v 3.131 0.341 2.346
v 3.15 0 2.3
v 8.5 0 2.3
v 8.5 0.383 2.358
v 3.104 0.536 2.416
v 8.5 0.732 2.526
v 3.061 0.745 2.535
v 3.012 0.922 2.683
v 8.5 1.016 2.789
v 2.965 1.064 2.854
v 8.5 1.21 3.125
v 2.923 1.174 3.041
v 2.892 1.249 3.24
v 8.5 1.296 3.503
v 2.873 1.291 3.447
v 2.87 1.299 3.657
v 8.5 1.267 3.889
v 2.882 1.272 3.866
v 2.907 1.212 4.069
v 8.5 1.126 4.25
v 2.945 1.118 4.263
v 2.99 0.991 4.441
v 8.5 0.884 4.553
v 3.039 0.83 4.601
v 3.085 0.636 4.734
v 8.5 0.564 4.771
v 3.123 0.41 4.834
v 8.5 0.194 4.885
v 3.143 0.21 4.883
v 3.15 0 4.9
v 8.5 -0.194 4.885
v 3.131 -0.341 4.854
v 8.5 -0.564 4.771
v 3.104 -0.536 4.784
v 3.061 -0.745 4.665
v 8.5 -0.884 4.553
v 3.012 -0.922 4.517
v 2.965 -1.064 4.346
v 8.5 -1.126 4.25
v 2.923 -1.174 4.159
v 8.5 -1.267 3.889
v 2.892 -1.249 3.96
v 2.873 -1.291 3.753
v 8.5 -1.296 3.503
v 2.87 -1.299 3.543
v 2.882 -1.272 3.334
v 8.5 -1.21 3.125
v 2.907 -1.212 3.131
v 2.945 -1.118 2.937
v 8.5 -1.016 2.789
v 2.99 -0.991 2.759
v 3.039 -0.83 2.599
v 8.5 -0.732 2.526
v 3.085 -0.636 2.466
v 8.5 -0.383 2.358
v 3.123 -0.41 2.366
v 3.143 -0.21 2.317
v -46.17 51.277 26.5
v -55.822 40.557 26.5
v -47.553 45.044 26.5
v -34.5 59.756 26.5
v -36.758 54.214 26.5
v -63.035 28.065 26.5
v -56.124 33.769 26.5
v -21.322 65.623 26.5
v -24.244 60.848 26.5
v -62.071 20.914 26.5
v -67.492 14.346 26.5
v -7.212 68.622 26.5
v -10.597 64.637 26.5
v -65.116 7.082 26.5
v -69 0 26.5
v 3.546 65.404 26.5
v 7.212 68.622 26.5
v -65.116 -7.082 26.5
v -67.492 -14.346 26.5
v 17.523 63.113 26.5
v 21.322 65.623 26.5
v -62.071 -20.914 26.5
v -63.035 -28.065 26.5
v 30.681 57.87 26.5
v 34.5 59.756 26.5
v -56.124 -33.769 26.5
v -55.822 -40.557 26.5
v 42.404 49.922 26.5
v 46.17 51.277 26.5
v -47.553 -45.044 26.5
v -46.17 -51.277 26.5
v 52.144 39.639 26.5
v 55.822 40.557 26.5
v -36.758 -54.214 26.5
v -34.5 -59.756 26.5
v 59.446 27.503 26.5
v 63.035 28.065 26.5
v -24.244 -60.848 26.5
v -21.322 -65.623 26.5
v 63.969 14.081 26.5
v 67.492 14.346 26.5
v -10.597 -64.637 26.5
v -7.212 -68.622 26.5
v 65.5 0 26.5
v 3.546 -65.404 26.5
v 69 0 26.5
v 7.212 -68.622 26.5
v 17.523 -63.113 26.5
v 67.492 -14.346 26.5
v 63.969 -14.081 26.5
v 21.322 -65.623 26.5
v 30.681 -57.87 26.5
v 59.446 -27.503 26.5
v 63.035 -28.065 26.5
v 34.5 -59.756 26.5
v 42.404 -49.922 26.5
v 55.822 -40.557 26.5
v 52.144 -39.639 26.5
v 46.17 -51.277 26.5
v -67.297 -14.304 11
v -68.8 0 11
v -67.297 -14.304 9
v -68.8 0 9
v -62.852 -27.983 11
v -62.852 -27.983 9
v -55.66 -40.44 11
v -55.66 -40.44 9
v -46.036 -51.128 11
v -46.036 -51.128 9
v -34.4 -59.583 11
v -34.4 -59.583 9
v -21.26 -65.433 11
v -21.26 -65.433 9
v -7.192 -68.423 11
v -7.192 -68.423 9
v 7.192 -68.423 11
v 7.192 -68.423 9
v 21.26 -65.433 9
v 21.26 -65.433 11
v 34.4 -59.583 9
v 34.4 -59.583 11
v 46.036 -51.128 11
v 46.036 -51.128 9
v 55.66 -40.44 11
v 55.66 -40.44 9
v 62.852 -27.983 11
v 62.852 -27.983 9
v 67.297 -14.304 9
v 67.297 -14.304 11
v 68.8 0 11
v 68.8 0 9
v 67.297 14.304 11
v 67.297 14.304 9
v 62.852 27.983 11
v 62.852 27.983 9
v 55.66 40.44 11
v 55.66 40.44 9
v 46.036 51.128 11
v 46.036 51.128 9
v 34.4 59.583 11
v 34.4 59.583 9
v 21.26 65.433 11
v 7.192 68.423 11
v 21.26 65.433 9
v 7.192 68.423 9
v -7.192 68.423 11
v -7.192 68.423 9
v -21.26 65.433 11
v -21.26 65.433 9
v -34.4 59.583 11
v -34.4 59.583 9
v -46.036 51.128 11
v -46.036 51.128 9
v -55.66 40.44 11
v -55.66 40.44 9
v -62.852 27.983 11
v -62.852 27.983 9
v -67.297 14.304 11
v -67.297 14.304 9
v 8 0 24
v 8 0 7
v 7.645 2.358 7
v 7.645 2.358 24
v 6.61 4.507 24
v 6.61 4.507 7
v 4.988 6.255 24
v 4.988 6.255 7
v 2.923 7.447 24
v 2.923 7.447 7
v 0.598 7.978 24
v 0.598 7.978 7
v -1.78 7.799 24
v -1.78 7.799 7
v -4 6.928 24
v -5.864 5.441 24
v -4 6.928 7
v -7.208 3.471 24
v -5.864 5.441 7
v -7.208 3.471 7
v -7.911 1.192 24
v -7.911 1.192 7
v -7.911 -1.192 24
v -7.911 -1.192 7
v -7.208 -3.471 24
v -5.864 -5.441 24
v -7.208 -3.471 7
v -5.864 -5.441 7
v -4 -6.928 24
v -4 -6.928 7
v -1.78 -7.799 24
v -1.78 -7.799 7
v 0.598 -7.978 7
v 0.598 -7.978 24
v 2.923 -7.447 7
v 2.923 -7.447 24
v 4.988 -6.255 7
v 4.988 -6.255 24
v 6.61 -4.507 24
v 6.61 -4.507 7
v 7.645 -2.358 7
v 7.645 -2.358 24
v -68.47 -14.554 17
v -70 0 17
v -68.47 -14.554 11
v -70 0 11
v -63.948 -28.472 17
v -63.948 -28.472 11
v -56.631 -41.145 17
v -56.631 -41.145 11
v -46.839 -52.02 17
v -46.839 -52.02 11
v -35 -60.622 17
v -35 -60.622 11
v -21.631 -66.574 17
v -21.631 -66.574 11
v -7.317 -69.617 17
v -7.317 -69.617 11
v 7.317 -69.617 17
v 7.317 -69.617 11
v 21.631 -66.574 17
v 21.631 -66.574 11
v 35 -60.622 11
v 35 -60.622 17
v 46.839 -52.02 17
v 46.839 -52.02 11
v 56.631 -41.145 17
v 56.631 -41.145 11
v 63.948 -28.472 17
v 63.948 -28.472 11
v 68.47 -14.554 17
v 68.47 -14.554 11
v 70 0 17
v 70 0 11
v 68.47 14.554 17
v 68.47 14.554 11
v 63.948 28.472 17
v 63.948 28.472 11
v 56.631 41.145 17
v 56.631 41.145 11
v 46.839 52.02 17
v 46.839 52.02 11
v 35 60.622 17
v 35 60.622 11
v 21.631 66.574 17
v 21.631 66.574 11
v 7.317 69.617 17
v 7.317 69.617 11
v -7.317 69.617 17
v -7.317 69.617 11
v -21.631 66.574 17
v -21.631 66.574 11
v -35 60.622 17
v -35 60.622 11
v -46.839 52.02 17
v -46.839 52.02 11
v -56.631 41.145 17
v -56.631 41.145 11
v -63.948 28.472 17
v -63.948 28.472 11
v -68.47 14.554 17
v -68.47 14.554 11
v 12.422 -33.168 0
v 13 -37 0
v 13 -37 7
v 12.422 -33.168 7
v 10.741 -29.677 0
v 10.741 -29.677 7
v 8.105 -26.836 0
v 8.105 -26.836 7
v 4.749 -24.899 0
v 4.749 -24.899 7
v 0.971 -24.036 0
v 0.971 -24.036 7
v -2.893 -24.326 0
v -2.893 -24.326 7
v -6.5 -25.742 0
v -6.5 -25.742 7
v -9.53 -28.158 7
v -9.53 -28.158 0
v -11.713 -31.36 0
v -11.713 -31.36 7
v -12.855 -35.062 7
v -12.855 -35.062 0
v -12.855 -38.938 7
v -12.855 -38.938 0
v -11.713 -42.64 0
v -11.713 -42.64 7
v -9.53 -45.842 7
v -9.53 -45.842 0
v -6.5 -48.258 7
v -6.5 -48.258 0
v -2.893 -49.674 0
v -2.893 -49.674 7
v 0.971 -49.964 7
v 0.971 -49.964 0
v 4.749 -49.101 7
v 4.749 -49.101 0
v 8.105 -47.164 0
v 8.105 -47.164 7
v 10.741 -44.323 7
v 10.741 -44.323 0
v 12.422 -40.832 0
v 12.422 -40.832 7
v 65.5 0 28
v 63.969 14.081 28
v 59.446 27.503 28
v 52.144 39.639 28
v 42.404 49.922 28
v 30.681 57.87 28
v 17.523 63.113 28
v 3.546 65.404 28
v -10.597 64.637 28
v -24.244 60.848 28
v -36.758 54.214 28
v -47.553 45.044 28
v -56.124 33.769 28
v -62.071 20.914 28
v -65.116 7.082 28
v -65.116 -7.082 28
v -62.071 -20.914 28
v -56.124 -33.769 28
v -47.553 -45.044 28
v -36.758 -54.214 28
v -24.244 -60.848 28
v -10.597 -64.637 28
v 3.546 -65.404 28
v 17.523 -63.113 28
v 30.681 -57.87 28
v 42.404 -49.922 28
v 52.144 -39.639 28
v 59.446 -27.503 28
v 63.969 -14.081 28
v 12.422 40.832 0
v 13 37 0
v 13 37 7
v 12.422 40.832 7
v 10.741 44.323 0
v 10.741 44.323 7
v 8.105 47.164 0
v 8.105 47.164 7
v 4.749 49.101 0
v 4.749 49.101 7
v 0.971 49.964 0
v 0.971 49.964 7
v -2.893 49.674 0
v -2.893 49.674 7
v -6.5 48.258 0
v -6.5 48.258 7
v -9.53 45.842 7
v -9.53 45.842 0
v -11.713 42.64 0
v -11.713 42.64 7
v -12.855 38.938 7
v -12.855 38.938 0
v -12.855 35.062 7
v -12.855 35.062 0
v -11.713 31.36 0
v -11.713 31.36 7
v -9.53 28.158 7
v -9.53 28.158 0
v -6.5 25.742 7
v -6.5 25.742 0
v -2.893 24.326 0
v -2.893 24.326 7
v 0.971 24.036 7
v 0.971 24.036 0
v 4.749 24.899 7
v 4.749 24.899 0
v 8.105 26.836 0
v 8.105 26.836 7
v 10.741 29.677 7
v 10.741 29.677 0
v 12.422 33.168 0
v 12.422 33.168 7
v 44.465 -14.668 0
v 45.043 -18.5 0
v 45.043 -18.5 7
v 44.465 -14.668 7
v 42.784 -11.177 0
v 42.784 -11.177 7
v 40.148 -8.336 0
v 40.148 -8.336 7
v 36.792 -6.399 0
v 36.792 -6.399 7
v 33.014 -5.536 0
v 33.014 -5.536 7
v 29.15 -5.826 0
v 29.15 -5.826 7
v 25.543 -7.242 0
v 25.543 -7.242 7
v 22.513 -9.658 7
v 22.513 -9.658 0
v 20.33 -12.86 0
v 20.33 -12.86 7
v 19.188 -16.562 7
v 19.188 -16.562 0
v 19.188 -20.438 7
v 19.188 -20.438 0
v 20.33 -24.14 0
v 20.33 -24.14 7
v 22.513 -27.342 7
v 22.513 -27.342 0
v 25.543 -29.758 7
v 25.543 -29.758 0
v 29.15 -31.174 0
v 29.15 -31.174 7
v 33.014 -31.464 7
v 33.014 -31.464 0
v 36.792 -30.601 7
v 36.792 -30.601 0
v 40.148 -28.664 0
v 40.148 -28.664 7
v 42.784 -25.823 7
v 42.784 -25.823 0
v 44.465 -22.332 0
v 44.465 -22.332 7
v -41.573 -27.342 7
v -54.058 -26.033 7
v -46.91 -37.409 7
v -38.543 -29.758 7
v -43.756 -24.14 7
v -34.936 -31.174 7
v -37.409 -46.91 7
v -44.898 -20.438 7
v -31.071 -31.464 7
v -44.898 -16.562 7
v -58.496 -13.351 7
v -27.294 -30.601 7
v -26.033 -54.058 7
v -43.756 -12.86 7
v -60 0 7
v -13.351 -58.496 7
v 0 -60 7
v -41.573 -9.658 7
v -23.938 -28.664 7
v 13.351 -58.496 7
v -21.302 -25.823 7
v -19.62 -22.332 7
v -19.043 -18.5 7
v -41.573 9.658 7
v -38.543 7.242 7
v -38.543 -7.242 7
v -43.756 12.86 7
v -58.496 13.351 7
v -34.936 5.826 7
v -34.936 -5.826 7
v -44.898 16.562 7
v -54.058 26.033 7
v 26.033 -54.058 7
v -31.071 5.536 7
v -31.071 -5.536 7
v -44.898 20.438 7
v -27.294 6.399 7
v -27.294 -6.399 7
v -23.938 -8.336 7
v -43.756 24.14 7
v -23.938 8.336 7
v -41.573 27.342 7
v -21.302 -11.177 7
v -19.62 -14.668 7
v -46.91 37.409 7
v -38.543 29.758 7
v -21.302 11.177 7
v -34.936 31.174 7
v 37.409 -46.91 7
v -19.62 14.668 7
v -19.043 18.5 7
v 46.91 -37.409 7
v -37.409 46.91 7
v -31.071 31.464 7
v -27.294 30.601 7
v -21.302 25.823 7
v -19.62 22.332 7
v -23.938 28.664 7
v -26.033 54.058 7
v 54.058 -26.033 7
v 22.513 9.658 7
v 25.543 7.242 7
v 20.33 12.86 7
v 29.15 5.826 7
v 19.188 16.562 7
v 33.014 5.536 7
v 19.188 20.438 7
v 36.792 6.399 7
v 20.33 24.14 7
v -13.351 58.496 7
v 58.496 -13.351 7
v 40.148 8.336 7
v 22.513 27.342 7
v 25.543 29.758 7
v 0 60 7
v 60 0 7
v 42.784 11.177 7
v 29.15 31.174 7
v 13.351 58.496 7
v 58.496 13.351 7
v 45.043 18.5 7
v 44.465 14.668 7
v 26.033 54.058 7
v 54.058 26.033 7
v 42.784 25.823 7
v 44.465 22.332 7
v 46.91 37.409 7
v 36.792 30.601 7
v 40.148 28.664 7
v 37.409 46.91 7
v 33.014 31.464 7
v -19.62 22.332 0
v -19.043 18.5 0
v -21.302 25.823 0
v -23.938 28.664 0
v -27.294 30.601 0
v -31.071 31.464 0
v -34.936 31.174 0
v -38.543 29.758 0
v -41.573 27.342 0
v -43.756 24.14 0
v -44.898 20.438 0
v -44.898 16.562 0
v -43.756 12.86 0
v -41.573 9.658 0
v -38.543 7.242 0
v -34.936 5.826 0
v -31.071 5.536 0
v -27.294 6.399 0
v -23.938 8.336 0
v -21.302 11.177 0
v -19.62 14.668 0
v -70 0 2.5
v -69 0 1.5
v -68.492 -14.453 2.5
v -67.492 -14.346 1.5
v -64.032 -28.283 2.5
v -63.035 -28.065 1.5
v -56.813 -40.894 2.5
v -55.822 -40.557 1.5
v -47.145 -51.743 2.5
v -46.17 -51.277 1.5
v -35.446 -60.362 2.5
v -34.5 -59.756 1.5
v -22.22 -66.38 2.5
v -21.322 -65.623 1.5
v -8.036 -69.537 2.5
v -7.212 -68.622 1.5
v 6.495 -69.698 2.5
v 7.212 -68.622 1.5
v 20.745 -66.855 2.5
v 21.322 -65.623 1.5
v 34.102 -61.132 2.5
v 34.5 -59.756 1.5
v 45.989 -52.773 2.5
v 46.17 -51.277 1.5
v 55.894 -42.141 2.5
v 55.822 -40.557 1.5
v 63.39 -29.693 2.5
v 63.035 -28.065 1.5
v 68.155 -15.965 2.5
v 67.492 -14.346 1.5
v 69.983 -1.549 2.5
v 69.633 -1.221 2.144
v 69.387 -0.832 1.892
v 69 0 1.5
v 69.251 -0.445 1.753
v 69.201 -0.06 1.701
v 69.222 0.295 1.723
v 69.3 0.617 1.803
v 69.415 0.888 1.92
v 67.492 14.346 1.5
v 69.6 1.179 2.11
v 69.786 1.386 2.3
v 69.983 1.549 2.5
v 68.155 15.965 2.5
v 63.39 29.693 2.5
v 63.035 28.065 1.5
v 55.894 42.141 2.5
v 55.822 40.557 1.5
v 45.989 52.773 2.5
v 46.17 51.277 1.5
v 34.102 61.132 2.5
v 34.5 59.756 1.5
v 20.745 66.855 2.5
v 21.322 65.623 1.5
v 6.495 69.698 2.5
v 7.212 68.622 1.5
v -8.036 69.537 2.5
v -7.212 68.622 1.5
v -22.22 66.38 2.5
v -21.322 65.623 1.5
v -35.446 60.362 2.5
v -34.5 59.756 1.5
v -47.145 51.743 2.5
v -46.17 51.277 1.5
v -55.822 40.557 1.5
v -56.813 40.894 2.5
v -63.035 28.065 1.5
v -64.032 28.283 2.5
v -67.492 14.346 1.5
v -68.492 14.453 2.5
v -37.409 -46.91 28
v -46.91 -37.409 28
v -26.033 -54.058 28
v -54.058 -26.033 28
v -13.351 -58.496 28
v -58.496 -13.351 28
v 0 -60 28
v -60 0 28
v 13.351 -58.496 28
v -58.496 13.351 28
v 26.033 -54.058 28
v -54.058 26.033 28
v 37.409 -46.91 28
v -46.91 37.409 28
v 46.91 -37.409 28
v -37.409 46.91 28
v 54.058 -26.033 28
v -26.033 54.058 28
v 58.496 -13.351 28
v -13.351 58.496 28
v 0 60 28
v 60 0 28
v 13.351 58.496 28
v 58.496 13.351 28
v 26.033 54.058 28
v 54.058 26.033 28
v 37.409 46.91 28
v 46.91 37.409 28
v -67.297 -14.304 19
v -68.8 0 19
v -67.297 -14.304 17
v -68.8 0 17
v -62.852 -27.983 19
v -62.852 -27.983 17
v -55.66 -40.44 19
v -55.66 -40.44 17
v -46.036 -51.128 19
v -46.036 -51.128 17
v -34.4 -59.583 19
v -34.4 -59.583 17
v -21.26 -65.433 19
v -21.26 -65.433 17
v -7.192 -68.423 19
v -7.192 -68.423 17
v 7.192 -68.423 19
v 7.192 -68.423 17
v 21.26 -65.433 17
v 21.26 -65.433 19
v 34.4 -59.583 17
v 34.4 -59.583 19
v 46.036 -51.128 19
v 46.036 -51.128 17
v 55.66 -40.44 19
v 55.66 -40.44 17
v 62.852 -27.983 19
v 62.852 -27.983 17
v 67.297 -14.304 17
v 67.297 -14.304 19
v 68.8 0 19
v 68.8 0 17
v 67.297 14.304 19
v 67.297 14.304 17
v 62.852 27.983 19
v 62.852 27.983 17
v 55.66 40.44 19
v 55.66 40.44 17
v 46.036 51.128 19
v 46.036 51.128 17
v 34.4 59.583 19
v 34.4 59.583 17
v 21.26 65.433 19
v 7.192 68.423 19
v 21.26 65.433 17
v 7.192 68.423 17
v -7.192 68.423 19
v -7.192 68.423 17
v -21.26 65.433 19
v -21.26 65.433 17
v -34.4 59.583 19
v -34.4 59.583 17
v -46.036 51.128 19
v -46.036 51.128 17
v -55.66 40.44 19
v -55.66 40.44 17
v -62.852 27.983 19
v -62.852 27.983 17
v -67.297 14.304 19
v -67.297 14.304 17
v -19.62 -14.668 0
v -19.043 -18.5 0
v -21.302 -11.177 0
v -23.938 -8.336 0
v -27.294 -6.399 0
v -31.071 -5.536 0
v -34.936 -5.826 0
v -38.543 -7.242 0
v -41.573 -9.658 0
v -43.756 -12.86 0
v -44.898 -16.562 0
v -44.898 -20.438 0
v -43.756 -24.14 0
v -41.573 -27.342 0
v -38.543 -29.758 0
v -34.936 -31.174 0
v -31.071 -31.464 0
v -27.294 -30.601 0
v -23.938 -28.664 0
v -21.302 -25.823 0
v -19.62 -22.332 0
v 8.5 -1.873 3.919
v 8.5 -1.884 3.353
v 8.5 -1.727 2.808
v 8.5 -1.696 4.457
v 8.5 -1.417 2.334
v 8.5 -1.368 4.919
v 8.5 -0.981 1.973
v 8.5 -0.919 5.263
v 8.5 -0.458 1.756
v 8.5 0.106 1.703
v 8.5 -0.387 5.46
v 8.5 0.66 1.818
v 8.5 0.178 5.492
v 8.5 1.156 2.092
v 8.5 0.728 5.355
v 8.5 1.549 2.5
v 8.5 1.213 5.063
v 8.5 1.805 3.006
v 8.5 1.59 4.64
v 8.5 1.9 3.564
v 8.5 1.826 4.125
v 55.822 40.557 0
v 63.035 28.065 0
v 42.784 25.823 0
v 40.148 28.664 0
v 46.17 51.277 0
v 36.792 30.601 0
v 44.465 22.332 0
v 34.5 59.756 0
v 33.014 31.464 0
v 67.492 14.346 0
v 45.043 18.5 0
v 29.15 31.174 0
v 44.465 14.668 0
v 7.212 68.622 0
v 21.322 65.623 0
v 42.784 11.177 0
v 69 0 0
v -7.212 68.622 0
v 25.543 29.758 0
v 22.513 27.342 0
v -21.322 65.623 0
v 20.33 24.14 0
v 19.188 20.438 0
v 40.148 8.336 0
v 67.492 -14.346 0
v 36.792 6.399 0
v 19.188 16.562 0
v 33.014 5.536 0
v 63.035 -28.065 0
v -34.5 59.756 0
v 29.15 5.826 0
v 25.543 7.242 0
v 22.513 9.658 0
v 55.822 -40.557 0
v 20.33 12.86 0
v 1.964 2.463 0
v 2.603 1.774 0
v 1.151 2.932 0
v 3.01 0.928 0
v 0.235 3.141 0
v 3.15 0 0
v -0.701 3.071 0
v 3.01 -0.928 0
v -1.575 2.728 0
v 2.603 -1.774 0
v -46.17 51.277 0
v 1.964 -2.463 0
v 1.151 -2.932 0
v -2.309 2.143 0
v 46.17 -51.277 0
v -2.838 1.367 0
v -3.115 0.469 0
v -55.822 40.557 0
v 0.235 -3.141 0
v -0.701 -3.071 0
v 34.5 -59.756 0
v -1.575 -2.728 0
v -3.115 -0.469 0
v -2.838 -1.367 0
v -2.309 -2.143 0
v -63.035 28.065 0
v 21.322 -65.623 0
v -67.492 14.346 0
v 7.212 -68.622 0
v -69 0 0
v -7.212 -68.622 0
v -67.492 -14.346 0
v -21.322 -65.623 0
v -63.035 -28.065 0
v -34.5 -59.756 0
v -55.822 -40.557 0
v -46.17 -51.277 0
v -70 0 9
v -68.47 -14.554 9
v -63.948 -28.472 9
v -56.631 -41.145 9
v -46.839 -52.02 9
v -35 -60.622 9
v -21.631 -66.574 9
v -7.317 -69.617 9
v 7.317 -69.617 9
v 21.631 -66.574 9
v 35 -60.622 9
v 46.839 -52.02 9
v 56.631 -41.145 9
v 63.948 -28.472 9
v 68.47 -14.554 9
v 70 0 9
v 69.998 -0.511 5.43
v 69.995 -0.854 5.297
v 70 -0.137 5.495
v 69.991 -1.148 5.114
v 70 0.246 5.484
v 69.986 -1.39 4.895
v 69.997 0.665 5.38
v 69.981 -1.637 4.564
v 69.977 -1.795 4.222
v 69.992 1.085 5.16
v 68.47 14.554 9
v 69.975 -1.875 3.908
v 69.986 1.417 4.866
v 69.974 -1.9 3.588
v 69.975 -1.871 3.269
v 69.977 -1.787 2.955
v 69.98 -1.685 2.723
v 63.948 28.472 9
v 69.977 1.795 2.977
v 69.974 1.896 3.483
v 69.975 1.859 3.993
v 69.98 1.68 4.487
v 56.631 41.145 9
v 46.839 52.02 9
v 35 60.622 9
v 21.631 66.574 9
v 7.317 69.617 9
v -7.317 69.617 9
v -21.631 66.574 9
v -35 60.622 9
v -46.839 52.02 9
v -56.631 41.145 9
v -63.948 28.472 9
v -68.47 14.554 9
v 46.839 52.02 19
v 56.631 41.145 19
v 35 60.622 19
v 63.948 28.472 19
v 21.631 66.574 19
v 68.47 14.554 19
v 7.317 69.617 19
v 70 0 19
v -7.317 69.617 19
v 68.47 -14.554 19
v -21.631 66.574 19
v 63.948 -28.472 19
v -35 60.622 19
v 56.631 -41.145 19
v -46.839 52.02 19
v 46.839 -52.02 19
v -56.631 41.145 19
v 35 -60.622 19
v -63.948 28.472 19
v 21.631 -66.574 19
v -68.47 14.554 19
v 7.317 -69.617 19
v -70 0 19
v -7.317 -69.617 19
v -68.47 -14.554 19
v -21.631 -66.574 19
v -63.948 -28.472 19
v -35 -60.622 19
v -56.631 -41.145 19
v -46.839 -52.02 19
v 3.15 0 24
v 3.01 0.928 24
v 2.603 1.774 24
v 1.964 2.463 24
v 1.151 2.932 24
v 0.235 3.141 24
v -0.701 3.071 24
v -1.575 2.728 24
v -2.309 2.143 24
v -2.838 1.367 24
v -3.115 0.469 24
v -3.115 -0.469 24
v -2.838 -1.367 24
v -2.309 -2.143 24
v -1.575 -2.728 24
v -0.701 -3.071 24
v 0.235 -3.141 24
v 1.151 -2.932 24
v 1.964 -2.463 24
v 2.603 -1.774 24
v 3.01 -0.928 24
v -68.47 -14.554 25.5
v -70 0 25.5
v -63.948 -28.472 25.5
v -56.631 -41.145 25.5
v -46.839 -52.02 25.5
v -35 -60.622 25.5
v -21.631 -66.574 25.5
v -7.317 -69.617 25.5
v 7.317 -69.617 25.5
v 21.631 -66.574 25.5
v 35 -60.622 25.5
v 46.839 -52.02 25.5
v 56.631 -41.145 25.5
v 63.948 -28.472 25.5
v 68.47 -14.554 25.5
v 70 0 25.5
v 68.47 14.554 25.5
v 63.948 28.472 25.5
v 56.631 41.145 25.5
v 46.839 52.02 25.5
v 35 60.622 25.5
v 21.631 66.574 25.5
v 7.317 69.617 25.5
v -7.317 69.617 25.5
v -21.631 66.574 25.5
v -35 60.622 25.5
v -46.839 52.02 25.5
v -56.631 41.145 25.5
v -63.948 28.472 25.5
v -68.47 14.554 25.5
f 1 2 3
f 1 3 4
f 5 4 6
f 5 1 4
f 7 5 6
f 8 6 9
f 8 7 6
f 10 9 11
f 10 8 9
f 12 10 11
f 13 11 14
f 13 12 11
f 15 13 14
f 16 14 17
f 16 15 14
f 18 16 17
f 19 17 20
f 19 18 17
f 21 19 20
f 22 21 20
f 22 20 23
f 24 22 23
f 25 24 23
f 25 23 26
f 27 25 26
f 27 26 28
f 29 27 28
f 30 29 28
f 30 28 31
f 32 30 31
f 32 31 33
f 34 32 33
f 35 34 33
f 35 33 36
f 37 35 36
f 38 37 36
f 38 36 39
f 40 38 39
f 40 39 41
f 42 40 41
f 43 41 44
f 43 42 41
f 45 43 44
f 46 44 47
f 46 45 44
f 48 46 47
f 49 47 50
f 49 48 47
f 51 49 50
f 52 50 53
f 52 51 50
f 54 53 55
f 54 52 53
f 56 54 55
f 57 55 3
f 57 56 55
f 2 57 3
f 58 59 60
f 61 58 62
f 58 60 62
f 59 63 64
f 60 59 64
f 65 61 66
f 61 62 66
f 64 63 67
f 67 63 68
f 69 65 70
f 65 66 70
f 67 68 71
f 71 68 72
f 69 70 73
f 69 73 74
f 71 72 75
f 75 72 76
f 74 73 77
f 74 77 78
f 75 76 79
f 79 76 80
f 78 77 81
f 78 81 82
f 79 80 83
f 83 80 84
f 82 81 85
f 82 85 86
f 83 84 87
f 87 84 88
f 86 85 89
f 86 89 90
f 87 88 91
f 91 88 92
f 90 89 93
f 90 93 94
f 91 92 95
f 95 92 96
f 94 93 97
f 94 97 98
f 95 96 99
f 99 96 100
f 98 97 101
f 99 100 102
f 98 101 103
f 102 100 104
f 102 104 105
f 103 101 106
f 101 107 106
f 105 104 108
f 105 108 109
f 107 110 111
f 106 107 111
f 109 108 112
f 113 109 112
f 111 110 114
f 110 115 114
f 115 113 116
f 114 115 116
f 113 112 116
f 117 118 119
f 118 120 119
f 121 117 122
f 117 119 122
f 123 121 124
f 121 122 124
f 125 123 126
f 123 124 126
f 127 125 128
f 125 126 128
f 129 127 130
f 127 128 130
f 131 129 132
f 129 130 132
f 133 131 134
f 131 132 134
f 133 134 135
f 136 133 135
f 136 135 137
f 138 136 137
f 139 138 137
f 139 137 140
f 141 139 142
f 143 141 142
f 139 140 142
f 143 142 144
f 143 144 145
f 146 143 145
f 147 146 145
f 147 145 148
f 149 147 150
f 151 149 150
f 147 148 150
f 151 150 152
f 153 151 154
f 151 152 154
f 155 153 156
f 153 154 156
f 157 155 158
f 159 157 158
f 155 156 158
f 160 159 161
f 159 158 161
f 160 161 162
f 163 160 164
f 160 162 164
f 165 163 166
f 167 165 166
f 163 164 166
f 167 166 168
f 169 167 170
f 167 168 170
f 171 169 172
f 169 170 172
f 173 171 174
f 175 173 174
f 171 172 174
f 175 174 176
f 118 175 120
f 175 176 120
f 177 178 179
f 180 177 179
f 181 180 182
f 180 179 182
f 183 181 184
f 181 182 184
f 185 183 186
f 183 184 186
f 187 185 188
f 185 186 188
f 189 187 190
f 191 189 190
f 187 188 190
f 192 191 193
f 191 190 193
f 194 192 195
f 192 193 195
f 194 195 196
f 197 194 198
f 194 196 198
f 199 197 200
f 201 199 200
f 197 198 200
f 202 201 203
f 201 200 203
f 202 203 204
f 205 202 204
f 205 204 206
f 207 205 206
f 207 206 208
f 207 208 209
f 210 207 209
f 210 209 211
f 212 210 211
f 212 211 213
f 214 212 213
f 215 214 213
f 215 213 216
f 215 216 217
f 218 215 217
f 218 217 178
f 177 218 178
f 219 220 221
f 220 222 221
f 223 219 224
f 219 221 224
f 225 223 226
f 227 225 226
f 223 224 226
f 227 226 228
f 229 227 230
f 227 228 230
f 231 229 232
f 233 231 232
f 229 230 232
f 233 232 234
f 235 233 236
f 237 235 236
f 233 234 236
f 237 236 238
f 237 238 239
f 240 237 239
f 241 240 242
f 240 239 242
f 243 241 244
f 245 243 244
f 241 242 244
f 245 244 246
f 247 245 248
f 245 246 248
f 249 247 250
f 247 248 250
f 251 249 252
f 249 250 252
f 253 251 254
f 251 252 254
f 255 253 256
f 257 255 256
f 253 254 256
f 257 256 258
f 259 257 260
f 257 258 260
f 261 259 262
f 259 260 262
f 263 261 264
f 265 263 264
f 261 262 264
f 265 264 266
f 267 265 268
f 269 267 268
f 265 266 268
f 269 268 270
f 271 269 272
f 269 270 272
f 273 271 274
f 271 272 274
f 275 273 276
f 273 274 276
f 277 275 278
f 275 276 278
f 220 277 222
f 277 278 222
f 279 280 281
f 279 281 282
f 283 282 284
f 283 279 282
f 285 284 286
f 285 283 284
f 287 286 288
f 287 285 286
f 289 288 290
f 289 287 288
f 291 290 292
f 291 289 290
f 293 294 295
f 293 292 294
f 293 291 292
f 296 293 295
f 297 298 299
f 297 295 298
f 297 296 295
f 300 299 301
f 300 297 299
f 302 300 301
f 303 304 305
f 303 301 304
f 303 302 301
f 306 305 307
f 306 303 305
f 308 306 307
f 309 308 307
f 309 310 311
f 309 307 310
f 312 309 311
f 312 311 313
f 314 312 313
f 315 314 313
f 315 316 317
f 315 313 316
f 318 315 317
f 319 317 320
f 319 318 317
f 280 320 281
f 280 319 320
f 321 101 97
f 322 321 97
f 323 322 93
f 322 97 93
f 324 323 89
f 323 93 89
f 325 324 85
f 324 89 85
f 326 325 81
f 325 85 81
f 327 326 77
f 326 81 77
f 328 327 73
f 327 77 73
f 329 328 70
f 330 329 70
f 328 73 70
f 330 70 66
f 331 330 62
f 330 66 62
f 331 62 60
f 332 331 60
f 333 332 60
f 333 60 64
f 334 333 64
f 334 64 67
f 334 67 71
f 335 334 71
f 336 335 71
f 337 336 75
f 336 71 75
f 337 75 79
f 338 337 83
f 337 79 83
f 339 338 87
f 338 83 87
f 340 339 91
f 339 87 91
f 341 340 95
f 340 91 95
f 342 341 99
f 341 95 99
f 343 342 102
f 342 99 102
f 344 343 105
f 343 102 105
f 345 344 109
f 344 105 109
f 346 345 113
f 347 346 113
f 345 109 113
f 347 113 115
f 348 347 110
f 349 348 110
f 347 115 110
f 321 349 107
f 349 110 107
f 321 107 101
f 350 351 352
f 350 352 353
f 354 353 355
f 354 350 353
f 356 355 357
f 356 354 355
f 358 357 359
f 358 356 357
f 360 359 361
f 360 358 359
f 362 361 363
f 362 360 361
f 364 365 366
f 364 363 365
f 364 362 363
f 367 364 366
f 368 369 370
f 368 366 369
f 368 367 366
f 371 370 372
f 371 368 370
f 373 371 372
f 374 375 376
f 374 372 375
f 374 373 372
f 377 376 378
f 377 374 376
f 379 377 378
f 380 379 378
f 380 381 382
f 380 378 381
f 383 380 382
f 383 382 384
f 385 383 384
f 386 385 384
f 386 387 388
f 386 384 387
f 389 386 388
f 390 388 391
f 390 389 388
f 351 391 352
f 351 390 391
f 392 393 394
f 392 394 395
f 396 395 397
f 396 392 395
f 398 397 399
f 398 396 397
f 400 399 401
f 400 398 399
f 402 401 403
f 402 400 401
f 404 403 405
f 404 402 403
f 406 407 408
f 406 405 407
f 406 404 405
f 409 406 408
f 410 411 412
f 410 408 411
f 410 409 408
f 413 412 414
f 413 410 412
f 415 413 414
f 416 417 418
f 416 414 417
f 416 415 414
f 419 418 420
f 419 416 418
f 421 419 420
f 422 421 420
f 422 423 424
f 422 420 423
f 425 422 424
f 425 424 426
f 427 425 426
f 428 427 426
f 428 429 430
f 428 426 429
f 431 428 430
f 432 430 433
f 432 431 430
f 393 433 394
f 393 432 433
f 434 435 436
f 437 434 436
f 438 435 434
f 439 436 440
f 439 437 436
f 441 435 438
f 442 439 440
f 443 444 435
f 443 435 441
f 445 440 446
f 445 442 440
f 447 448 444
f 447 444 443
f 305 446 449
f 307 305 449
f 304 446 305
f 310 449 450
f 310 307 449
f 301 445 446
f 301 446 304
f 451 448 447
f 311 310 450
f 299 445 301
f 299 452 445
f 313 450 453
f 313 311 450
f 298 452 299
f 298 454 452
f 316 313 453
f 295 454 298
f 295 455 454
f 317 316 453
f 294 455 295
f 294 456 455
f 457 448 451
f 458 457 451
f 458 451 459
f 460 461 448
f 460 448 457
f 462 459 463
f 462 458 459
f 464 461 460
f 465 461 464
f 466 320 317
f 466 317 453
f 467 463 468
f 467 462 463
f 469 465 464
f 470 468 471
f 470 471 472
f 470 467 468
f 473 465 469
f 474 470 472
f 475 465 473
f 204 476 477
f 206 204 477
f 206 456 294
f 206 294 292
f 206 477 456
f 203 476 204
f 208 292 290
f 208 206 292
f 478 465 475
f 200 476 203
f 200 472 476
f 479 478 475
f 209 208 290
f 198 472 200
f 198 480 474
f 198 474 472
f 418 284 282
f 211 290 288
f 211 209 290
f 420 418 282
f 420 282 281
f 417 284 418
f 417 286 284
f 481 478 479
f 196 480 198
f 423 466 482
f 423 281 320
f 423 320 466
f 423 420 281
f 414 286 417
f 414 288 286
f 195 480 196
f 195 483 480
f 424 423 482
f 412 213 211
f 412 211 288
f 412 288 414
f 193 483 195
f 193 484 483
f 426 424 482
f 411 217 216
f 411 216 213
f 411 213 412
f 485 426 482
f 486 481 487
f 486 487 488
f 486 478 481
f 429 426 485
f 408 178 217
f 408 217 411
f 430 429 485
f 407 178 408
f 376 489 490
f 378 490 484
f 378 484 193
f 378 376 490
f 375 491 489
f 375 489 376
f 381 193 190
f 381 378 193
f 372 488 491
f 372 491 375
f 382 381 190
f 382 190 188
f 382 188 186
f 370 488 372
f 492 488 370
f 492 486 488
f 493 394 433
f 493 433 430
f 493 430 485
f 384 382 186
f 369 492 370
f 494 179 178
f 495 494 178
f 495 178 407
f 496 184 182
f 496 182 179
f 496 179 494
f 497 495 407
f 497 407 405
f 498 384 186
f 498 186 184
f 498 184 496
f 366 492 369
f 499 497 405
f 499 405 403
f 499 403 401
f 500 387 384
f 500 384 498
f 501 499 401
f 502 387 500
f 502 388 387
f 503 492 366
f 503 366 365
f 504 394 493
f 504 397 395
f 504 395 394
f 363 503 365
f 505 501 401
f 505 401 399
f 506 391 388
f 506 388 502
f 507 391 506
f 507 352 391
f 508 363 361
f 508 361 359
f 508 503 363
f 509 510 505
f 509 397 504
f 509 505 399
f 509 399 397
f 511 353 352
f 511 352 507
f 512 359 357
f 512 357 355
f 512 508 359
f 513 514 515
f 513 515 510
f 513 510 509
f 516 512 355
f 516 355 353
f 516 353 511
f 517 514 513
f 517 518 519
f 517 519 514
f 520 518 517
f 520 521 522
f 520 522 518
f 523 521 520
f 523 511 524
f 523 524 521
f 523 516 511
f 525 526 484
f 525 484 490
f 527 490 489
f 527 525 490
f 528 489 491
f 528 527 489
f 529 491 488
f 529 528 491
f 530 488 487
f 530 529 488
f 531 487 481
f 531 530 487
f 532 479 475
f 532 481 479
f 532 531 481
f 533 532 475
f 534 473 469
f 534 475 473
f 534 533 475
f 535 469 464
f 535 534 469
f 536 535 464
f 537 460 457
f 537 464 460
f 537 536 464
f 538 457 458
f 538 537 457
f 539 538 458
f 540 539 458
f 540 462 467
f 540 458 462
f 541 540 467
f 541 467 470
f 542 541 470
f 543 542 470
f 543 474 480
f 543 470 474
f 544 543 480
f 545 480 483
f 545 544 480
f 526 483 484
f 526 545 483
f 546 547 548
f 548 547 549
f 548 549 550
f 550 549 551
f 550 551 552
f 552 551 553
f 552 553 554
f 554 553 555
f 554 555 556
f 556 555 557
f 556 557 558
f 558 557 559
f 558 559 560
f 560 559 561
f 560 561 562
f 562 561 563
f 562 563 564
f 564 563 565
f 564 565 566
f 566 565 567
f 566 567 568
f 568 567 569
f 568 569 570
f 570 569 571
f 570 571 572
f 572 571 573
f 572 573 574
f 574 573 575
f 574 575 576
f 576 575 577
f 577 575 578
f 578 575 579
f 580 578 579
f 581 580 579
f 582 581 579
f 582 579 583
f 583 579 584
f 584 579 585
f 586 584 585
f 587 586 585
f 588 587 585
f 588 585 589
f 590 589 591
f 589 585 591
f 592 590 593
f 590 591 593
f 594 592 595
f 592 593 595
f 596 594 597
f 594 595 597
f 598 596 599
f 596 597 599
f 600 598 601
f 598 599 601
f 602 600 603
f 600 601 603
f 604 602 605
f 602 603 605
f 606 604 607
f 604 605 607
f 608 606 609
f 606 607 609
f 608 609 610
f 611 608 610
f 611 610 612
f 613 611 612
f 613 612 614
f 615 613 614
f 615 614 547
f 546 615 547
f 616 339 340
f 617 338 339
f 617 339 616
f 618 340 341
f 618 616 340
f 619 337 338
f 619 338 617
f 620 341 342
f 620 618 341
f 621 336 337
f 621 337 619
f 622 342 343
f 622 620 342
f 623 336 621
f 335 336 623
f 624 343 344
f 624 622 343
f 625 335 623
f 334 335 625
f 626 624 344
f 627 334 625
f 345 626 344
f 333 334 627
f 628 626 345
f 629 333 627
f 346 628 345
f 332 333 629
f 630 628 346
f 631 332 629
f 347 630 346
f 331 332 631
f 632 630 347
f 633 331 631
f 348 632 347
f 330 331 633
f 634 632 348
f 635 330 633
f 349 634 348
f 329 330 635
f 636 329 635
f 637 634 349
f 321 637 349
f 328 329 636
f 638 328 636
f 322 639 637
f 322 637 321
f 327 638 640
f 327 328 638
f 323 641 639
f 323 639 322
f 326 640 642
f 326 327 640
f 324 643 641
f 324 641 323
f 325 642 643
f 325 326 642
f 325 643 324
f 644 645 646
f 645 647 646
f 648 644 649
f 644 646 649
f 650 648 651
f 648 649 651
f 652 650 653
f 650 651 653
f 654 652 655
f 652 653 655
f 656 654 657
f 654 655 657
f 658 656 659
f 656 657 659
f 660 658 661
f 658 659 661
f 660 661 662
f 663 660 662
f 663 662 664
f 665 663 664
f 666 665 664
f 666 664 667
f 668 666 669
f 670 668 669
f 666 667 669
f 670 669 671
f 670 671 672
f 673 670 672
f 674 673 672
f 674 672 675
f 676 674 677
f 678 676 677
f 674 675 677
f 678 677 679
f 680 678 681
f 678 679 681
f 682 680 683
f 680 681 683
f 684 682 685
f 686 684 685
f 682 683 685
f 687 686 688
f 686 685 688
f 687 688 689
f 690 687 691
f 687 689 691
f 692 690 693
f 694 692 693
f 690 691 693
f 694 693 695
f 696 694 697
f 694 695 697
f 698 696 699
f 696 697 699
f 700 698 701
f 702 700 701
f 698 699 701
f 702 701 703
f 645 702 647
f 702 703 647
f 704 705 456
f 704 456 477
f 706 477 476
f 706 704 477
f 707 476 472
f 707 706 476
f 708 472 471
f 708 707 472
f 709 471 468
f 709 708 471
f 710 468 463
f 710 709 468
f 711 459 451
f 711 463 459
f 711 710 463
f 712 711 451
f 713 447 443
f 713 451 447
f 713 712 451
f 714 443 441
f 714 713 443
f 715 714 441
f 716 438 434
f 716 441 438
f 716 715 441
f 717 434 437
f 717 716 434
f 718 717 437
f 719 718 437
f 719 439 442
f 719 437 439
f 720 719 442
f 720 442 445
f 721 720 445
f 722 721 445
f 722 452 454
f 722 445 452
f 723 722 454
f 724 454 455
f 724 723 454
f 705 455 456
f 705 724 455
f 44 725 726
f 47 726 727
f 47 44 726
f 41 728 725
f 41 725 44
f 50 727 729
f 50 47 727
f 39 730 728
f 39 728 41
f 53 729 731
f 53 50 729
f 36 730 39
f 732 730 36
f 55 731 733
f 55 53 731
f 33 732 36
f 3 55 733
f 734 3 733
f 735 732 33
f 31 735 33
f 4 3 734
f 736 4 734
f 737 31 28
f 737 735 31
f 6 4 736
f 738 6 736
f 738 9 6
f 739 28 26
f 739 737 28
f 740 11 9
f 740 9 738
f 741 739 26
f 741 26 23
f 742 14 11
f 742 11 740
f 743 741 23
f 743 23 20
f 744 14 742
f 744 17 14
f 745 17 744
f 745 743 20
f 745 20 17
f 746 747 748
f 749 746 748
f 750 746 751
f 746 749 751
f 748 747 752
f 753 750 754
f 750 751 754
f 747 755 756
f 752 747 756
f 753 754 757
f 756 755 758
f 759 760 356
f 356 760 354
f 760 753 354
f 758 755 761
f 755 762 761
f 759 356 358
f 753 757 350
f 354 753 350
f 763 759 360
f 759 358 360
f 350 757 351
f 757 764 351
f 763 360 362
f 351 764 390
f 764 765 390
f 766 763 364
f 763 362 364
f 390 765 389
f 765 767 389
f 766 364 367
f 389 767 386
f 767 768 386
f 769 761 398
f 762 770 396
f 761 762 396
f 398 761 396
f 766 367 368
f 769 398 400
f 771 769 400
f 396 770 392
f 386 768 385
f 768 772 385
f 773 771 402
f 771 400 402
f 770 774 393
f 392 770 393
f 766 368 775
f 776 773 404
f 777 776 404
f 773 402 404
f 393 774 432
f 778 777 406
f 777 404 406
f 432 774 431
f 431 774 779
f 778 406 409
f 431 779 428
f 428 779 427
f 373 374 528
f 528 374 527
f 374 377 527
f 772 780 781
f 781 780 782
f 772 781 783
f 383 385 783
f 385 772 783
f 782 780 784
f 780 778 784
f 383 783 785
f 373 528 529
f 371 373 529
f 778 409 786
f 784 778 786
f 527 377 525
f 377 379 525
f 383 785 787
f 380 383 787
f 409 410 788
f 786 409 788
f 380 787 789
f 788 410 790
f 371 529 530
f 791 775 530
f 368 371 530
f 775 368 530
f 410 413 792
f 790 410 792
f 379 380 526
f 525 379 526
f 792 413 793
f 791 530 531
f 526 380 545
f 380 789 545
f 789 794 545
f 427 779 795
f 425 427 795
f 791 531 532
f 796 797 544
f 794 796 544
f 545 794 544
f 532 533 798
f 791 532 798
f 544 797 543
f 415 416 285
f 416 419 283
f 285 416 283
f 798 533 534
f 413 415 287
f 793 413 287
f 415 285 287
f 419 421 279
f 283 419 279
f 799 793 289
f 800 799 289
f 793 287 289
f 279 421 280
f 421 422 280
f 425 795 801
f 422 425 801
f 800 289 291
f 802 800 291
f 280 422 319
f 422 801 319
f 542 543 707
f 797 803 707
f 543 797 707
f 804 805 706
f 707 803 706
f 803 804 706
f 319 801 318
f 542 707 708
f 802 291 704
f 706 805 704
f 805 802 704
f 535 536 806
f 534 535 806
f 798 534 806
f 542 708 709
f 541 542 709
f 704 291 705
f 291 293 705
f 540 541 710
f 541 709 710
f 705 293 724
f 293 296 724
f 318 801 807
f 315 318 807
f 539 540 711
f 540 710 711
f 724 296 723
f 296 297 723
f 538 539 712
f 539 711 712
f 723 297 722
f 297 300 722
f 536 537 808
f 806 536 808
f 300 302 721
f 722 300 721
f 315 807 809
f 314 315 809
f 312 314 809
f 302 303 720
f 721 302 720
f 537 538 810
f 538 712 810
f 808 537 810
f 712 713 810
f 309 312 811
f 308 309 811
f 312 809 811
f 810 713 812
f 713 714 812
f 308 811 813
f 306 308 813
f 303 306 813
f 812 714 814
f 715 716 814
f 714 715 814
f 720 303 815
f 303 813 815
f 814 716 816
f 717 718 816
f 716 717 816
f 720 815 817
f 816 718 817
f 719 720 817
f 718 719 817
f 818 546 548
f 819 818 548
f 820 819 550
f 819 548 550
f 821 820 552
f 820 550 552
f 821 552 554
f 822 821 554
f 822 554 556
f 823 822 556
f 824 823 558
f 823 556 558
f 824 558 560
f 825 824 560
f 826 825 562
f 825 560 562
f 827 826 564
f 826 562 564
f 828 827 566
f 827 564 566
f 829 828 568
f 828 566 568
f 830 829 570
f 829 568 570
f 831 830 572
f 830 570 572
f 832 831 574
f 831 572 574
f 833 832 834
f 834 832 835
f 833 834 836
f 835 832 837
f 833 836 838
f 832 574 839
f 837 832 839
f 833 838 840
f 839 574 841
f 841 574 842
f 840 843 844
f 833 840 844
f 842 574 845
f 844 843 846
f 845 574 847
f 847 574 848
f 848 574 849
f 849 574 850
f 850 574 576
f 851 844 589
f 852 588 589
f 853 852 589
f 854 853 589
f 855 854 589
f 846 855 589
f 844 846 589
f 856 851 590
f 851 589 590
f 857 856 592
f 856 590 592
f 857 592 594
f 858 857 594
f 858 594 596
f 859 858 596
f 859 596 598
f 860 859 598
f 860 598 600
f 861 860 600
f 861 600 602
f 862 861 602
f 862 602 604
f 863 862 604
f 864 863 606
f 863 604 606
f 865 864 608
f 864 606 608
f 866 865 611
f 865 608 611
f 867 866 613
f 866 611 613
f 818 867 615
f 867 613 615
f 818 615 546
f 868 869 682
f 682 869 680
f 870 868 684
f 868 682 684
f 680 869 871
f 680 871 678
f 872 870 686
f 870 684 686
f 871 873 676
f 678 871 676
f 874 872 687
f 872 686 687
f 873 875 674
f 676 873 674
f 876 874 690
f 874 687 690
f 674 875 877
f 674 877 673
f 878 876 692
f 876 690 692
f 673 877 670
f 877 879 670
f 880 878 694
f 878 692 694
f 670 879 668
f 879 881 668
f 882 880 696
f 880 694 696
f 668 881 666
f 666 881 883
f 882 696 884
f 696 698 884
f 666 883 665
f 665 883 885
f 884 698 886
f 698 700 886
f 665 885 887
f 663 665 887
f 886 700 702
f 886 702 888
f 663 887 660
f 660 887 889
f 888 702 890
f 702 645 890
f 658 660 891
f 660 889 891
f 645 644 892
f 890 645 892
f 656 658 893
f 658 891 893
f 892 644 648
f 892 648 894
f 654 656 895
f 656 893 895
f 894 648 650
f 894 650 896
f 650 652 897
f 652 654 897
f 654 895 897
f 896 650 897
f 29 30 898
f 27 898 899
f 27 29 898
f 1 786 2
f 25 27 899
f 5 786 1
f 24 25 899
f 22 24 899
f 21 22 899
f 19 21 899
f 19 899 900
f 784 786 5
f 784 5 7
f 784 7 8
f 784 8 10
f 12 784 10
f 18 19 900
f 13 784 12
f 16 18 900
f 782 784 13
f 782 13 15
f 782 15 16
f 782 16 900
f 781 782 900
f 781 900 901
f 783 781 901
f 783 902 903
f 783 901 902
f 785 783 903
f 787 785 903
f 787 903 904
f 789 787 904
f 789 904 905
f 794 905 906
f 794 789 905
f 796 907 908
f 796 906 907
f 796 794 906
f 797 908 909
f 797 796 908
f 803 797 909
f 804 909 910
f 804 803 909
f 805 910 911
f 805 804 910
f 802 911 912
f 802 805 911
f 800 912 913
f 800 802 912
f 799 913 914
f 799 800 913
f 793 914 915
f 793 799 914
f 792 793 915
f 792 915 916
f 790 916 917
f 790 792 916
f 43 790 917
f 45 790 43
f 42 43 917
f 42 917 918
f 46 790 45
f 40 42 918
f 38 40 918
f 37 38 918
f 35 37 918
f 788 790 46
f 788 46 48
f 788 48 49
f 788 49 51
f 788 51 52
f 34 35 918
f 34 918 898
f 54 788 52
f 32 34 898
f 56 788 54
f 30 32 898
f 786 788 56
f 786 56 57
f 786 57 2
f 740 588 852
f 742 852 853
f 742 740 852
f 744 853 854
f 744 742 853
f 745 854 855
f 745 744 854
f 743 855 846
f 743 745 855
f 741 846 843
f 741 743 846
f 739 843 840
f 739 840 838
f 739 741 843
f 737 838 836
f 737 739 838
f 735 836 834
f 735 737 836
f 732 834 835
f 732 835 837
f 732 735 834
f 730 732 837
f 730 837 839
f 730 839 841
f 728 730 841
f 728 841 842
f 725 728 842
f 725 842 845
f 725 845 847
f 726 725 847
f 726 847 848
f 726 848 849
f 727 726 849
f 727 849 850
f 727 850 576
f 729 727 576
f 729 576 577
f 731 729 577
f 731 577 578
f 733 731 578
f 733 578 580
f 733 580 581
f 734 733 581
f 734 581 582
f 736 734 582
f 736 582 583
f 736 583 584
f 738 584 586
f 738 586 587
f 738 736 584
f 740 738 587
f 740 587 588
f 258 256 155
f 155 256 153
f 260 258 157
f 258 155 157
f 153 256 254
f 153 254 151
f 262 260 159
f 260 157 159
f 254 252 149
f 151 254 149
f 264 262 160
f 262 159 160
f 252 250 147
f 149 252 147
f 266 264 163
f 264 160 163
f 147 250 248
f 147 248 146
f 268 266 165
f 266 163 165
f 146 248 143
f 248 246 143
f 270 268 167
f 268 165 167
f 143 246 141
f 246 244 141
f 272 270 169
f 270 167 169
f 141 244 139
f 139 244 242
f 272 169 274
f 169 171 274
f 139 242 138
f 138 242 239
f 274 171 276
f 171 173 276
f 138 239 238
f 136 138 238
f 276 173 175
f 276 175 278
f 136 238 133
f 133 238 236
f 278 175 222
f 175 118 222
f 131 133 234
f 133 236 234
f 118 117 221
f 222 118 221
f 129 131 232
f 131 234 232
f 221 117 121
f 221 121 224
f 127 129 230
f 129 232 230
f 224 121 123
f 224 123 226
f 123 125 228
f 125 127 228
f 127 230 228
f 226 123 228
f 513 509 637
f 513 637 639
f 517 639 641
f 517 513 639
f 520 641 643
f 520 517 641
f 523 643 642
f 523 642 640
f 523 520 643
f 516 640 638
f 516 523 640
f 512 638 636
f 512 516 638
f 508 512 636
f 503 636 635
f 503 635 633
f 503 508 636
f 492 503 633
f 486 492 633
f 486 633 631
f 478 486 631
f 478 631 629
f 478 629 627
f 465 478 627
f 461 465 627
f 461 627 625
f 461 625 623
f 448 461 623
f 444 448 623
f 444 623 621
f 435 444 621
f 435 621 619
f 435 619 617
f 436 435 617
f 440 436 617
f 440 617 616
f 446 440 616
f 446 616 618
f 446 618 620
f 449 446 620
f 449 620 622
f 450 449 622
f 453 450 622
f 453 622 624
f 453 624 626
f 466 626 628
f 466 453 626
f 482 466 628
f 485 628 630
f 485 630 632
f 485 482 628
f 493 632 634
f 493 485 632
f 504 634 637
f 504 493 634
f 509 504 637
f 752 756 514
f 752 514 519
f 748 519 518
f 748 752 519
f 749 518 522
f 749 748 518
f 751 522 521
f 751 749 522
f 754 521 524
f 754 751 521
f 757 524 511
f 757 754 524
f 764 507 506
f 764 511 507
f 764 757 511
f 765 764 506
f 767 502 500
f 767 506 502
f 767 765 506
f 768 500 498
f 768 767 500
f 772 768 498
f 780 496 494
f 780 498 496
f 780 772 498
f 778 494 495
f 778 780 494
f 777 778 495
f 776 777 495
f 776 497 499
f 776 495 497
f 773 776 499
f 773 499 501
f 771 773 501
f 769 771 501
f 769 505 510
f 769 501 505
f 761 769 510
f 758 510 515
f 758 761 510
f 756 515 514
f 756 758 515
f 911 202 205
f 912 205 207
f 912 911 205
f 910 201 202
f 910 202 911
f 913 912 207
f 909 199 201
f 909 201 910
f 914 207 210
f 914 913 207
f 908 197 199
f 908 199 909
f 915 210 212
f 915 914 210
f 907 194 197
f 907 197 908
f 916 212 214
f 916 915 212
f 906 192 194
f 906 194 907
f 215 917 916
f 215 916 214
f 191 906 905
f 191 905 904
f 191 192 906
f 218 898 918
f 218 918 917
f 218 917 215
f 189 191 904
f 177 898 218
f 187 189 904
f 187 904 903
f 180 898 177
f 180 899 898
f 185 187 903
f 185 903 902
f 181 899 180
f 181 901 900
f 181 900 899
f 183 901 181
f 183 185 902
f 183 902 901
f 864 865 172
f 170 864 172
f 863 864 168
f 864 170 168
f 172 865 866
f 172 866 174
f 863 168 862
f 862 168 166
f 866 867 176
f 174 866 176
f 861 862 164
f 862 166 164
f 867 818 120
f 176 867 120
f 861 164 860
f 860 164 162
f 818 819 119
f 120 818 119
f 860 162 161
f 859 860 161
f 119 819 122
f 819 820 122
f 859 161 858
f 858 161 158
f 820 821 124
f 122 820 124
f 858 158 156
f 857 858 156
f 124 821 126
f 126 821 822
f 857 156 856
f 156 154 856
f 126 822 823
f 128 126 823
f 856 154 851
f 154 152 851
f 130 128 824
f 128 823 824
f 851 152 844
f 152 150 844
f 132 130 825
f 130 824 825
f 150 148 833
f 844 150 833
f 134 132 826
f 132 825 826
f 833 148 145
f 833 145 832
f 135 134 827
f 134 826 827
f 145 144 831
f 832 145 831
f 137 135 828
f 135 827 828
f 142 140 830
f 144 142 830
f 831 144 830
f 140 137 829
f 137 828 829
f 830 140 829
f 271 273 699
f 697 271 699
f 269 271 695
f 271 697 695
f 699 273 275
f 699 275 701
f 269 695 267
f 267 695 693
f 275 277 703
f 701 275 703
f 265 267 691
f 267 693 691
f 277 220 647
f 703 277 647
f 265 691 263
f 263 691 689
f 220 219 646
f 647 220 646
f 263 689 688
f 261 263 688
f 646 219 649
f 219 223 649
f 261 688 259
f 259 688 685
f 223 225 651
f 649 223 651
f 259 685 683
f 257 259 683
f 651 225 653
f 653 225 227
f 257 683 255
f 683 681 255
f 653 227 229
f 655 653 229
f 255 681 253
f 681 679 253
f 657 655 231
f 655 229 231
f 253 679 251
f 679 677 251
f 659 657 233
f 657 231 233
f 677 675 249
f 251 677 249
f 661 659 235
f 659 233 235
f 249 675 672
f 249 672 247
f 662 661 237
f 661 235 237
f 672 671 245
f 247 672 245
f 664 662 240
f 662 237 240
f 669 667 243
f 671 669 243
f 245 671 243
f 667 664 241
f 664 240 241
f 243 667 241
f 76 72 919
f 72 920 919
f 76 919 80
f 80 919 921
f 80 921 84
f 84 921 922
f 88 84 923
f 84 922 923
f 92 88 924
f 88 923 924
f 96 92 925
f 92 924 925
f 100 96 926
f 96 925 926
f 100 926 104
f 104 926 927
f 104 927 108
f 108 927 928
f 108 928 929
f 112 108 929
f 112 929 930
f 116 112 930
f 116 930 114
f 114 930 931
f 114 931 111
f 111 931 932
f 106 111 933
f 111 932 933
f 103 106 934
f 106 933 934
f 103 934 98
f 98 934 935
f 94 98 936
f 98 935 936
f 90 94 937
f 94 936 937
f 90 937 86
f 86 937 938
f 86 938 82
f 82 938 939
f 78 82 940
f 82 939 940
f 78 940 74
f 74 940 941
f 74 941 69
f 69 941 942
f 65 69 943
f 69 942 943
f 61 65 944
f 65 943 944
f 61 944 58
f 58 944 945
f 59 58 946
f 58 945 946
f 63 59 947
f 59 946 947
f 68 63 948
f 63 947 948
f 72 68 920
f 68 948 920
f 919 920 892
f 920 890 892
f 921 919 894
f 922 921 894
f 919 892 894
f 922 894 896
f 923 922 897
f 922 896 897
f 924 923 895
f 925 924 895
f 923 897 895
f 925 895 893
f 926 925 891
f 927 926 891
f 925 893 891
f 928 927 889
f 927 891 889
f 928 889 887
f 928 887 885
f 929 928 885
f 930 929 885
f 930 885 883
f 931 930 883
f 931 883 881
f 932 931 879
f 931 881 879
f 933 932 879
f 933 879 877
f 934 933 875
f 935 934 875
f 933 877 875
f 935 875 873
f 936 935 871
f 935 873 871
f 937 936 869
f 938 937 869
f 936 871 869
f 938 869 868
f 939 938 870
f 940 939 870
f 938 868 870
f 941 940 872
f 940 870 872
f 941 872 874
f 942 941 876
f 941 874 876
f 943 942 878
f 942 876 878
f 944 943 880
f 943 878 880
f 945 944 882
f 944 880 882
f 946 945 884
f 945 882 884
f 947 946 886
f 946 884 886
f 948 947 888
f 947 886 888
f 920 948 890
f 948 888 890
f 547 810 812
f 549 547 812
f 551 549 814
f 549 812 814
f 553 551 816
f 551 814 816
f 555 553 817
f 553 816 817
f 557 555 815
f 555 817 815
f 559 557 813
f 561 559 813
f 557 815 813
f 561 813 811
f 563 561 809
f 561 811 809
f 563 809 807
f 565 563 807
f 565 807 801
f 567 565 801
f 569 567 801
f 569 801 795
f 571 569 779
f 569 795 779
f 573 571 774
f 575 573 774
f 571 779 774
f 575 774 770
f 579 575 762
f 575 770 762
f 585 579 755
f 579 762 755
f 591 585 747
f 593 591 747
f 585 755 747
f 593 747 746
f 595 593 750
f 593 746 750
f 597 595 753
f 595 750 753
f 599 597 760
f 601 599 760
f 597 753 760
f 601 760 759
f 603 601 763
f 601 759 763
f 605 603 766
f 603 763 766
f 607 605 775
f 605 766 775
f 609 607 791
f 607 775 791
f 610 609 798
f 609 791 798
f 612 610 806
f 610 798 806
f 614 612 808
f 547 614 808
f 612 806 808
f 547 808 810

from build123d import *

# Parameters (mm, degrees)
SKETCH1_R              = 64
SKETCH1_R_2            = 60
RIM_DEPTH              = 28
SKETCH2_R              = 65.5
SKETCH2_R_2            = 63
INNER_BEAD_LIP_DEPTH   = 1.5
SKETCH3_R              = 65.5
SKETCH3_R_2            = 63
OUTER_BEAD_LIP_DEPTH   = 1.5
SKETCH4_R              = 61
WEB_DEPTH              = 7
SKETCH5_R              = 8
HUB_BOSS_DEPTH         = 24
SKETCH6_R              = 13
LIGHTENING_HOLES_DEPTH = 9
SKETCH7_R              = 3.15
ROUND_BORE_6MM_DEPTH   = 30
SKETCH9_R              = 69
SKETCH9_R_2            = 64
BED_RING_DEPTH         = 1.5
SKETCH10_R             = 1.3
GRUB_SCREW_M3_DEPTH    = 9
SKETCH11_R             = 1.9
GRUB_KEY_ACCESS_DEPTH  = 62.5


with BuildPart() as part:
    # Sketch1 → Rim (new body)
    with BuildSketch(Plane.XY):
        Circle(SKETCH1_R)
        Circle(SKETCH1_R_2, mode=Mode.SUBTRACT)
    extrude(amount=RIM_DEPTH)

    # Sketch2 → Inner_bead_lip (add)
    with BuildSketch(Plane.XY):
        Circle(SKETCH2_R)
        Circle(SKETCH2_R_2, mode=Mode.SUBTRACT)
    extrude(amount=INNER_BEAD_LIP_DEPTH)

    # Sketch3 → Outer_bead_lip (add)
    with BuildSketch(Plane.XY.offset(26.5)):
        Circle(SKETCH3_R)
        Circle(SKETCH3_R_2, mode=Mode.SUBTRACT)
    extrude(amount=OUTER_BEAD_LIP_DEPTH)

    # Sketch4 → Web (add)
    with BuildSketch(Plane.XY):
        Circle(SKETCH4_R)
    extrude(amount=WEB_DEPTH)

    # Sketch5 → Hub_boss (add)
    with BuildSketch(Plane.XY):
        Circle(SKETCH5_R)
    extrude(amount=HUB_BOSS_DEPTH)

    # Sketch6 → Lightening_holes (cut)
    with BuildSketch(Plane.XY.offset(-1)):
        with Locations((32.04293994, 18.5)):
            Circle(SKETCH6_R)
        with Locations((0, 37)):
            Circle(SKETCH6_R)
        with Locations((-32.04293994, 18.5)):
            Circle(SKETCH6_R)
        with Locations((-32.04293994, -18.5)):
            Circle(SKETCH6_R)
        with Locations((0, -37)):
            Circle(SKETCH6_R)
        with Locations((32.04293994, -18.5)):
            Circle(SKETCH6_R)
    extrude(amount=LIGHTENING_HOLES_DEPTH, mode=Mode.SUBTRACT)

    # Sketch7 → Round_bore_6mm (cut)
    with BuildSketch(Plane.XY.offset(-1)):
        Circle(SKETCH7_R)
    extrude(amount=ROUND_BORE_6MM_DEPTH, mode=Mode.SUBTRACT)

    # Sketch8 → Tyre (revolve)
    with BuildSketch(Plane(origin=(0, 0, 0), x_dir=(0, 0, -1), z_dir=(1, 0, 0)), mode=Mode.PRIVATE) as tyre_sk:
        Polygon((-1.5, 64), (-26.5, 64), (-26.5, 69), (-25.5, 70), (-19, 70), (-19, 68.8), (-17, 68.8), (-17, 70), (-11, 70), (-11, 68.8), (-9, 68.8), (-9, 70), (-2.5, 70), (-1.5, 69), align=None)
    revolve(tyre_sk.sketch.rotate(Axis((0, 0, 0), (0, 0, 1)), 90), axis=Axis((0, 0, 0), (0, 0, 1)))

    # Sketch9 → Bed_ring (add)
    with BuildSketch(Plane.XY):
        with Locations(Location((0, 0, 0), (0, 0, 180))):
            Circle(SKETCH9_R)
        Circle(SKETCH9_R_2, mode=Mode.SUBTRACT)
    extrude(amount=BED_RING_DEPTH)

    # Sketch10 → Grub_screw_M3 (cut)
    with BuildSketch(Plane(origin=(0, 0, 0), x_dir=(0, 0, -1), z_dir=(1, 0, 0))):
        with Locations((-3.6, 0)):
            Circle(SKETCH10_R)
    extrude(amount=GRUB_SCREW_M3_DEPTH, mode=Mode.SUBTRACT)

    # Sketch11 → Grub_key_access (cut)
    with BuildSketch(Plane(origin=(8.5, 0, 0), x_dir=(0, 0, -1), z_dir=(1, 0, 0))):
        with Locations(Location((-3.6, 0, 0), (0, 0, 54.623459848))):
            Circle(SKETCH11_R)
    extrude(amount=GRUB_KEY_ACCESS_DEPTH, mode=Mode.SUBTRACT)


solid = part.part
